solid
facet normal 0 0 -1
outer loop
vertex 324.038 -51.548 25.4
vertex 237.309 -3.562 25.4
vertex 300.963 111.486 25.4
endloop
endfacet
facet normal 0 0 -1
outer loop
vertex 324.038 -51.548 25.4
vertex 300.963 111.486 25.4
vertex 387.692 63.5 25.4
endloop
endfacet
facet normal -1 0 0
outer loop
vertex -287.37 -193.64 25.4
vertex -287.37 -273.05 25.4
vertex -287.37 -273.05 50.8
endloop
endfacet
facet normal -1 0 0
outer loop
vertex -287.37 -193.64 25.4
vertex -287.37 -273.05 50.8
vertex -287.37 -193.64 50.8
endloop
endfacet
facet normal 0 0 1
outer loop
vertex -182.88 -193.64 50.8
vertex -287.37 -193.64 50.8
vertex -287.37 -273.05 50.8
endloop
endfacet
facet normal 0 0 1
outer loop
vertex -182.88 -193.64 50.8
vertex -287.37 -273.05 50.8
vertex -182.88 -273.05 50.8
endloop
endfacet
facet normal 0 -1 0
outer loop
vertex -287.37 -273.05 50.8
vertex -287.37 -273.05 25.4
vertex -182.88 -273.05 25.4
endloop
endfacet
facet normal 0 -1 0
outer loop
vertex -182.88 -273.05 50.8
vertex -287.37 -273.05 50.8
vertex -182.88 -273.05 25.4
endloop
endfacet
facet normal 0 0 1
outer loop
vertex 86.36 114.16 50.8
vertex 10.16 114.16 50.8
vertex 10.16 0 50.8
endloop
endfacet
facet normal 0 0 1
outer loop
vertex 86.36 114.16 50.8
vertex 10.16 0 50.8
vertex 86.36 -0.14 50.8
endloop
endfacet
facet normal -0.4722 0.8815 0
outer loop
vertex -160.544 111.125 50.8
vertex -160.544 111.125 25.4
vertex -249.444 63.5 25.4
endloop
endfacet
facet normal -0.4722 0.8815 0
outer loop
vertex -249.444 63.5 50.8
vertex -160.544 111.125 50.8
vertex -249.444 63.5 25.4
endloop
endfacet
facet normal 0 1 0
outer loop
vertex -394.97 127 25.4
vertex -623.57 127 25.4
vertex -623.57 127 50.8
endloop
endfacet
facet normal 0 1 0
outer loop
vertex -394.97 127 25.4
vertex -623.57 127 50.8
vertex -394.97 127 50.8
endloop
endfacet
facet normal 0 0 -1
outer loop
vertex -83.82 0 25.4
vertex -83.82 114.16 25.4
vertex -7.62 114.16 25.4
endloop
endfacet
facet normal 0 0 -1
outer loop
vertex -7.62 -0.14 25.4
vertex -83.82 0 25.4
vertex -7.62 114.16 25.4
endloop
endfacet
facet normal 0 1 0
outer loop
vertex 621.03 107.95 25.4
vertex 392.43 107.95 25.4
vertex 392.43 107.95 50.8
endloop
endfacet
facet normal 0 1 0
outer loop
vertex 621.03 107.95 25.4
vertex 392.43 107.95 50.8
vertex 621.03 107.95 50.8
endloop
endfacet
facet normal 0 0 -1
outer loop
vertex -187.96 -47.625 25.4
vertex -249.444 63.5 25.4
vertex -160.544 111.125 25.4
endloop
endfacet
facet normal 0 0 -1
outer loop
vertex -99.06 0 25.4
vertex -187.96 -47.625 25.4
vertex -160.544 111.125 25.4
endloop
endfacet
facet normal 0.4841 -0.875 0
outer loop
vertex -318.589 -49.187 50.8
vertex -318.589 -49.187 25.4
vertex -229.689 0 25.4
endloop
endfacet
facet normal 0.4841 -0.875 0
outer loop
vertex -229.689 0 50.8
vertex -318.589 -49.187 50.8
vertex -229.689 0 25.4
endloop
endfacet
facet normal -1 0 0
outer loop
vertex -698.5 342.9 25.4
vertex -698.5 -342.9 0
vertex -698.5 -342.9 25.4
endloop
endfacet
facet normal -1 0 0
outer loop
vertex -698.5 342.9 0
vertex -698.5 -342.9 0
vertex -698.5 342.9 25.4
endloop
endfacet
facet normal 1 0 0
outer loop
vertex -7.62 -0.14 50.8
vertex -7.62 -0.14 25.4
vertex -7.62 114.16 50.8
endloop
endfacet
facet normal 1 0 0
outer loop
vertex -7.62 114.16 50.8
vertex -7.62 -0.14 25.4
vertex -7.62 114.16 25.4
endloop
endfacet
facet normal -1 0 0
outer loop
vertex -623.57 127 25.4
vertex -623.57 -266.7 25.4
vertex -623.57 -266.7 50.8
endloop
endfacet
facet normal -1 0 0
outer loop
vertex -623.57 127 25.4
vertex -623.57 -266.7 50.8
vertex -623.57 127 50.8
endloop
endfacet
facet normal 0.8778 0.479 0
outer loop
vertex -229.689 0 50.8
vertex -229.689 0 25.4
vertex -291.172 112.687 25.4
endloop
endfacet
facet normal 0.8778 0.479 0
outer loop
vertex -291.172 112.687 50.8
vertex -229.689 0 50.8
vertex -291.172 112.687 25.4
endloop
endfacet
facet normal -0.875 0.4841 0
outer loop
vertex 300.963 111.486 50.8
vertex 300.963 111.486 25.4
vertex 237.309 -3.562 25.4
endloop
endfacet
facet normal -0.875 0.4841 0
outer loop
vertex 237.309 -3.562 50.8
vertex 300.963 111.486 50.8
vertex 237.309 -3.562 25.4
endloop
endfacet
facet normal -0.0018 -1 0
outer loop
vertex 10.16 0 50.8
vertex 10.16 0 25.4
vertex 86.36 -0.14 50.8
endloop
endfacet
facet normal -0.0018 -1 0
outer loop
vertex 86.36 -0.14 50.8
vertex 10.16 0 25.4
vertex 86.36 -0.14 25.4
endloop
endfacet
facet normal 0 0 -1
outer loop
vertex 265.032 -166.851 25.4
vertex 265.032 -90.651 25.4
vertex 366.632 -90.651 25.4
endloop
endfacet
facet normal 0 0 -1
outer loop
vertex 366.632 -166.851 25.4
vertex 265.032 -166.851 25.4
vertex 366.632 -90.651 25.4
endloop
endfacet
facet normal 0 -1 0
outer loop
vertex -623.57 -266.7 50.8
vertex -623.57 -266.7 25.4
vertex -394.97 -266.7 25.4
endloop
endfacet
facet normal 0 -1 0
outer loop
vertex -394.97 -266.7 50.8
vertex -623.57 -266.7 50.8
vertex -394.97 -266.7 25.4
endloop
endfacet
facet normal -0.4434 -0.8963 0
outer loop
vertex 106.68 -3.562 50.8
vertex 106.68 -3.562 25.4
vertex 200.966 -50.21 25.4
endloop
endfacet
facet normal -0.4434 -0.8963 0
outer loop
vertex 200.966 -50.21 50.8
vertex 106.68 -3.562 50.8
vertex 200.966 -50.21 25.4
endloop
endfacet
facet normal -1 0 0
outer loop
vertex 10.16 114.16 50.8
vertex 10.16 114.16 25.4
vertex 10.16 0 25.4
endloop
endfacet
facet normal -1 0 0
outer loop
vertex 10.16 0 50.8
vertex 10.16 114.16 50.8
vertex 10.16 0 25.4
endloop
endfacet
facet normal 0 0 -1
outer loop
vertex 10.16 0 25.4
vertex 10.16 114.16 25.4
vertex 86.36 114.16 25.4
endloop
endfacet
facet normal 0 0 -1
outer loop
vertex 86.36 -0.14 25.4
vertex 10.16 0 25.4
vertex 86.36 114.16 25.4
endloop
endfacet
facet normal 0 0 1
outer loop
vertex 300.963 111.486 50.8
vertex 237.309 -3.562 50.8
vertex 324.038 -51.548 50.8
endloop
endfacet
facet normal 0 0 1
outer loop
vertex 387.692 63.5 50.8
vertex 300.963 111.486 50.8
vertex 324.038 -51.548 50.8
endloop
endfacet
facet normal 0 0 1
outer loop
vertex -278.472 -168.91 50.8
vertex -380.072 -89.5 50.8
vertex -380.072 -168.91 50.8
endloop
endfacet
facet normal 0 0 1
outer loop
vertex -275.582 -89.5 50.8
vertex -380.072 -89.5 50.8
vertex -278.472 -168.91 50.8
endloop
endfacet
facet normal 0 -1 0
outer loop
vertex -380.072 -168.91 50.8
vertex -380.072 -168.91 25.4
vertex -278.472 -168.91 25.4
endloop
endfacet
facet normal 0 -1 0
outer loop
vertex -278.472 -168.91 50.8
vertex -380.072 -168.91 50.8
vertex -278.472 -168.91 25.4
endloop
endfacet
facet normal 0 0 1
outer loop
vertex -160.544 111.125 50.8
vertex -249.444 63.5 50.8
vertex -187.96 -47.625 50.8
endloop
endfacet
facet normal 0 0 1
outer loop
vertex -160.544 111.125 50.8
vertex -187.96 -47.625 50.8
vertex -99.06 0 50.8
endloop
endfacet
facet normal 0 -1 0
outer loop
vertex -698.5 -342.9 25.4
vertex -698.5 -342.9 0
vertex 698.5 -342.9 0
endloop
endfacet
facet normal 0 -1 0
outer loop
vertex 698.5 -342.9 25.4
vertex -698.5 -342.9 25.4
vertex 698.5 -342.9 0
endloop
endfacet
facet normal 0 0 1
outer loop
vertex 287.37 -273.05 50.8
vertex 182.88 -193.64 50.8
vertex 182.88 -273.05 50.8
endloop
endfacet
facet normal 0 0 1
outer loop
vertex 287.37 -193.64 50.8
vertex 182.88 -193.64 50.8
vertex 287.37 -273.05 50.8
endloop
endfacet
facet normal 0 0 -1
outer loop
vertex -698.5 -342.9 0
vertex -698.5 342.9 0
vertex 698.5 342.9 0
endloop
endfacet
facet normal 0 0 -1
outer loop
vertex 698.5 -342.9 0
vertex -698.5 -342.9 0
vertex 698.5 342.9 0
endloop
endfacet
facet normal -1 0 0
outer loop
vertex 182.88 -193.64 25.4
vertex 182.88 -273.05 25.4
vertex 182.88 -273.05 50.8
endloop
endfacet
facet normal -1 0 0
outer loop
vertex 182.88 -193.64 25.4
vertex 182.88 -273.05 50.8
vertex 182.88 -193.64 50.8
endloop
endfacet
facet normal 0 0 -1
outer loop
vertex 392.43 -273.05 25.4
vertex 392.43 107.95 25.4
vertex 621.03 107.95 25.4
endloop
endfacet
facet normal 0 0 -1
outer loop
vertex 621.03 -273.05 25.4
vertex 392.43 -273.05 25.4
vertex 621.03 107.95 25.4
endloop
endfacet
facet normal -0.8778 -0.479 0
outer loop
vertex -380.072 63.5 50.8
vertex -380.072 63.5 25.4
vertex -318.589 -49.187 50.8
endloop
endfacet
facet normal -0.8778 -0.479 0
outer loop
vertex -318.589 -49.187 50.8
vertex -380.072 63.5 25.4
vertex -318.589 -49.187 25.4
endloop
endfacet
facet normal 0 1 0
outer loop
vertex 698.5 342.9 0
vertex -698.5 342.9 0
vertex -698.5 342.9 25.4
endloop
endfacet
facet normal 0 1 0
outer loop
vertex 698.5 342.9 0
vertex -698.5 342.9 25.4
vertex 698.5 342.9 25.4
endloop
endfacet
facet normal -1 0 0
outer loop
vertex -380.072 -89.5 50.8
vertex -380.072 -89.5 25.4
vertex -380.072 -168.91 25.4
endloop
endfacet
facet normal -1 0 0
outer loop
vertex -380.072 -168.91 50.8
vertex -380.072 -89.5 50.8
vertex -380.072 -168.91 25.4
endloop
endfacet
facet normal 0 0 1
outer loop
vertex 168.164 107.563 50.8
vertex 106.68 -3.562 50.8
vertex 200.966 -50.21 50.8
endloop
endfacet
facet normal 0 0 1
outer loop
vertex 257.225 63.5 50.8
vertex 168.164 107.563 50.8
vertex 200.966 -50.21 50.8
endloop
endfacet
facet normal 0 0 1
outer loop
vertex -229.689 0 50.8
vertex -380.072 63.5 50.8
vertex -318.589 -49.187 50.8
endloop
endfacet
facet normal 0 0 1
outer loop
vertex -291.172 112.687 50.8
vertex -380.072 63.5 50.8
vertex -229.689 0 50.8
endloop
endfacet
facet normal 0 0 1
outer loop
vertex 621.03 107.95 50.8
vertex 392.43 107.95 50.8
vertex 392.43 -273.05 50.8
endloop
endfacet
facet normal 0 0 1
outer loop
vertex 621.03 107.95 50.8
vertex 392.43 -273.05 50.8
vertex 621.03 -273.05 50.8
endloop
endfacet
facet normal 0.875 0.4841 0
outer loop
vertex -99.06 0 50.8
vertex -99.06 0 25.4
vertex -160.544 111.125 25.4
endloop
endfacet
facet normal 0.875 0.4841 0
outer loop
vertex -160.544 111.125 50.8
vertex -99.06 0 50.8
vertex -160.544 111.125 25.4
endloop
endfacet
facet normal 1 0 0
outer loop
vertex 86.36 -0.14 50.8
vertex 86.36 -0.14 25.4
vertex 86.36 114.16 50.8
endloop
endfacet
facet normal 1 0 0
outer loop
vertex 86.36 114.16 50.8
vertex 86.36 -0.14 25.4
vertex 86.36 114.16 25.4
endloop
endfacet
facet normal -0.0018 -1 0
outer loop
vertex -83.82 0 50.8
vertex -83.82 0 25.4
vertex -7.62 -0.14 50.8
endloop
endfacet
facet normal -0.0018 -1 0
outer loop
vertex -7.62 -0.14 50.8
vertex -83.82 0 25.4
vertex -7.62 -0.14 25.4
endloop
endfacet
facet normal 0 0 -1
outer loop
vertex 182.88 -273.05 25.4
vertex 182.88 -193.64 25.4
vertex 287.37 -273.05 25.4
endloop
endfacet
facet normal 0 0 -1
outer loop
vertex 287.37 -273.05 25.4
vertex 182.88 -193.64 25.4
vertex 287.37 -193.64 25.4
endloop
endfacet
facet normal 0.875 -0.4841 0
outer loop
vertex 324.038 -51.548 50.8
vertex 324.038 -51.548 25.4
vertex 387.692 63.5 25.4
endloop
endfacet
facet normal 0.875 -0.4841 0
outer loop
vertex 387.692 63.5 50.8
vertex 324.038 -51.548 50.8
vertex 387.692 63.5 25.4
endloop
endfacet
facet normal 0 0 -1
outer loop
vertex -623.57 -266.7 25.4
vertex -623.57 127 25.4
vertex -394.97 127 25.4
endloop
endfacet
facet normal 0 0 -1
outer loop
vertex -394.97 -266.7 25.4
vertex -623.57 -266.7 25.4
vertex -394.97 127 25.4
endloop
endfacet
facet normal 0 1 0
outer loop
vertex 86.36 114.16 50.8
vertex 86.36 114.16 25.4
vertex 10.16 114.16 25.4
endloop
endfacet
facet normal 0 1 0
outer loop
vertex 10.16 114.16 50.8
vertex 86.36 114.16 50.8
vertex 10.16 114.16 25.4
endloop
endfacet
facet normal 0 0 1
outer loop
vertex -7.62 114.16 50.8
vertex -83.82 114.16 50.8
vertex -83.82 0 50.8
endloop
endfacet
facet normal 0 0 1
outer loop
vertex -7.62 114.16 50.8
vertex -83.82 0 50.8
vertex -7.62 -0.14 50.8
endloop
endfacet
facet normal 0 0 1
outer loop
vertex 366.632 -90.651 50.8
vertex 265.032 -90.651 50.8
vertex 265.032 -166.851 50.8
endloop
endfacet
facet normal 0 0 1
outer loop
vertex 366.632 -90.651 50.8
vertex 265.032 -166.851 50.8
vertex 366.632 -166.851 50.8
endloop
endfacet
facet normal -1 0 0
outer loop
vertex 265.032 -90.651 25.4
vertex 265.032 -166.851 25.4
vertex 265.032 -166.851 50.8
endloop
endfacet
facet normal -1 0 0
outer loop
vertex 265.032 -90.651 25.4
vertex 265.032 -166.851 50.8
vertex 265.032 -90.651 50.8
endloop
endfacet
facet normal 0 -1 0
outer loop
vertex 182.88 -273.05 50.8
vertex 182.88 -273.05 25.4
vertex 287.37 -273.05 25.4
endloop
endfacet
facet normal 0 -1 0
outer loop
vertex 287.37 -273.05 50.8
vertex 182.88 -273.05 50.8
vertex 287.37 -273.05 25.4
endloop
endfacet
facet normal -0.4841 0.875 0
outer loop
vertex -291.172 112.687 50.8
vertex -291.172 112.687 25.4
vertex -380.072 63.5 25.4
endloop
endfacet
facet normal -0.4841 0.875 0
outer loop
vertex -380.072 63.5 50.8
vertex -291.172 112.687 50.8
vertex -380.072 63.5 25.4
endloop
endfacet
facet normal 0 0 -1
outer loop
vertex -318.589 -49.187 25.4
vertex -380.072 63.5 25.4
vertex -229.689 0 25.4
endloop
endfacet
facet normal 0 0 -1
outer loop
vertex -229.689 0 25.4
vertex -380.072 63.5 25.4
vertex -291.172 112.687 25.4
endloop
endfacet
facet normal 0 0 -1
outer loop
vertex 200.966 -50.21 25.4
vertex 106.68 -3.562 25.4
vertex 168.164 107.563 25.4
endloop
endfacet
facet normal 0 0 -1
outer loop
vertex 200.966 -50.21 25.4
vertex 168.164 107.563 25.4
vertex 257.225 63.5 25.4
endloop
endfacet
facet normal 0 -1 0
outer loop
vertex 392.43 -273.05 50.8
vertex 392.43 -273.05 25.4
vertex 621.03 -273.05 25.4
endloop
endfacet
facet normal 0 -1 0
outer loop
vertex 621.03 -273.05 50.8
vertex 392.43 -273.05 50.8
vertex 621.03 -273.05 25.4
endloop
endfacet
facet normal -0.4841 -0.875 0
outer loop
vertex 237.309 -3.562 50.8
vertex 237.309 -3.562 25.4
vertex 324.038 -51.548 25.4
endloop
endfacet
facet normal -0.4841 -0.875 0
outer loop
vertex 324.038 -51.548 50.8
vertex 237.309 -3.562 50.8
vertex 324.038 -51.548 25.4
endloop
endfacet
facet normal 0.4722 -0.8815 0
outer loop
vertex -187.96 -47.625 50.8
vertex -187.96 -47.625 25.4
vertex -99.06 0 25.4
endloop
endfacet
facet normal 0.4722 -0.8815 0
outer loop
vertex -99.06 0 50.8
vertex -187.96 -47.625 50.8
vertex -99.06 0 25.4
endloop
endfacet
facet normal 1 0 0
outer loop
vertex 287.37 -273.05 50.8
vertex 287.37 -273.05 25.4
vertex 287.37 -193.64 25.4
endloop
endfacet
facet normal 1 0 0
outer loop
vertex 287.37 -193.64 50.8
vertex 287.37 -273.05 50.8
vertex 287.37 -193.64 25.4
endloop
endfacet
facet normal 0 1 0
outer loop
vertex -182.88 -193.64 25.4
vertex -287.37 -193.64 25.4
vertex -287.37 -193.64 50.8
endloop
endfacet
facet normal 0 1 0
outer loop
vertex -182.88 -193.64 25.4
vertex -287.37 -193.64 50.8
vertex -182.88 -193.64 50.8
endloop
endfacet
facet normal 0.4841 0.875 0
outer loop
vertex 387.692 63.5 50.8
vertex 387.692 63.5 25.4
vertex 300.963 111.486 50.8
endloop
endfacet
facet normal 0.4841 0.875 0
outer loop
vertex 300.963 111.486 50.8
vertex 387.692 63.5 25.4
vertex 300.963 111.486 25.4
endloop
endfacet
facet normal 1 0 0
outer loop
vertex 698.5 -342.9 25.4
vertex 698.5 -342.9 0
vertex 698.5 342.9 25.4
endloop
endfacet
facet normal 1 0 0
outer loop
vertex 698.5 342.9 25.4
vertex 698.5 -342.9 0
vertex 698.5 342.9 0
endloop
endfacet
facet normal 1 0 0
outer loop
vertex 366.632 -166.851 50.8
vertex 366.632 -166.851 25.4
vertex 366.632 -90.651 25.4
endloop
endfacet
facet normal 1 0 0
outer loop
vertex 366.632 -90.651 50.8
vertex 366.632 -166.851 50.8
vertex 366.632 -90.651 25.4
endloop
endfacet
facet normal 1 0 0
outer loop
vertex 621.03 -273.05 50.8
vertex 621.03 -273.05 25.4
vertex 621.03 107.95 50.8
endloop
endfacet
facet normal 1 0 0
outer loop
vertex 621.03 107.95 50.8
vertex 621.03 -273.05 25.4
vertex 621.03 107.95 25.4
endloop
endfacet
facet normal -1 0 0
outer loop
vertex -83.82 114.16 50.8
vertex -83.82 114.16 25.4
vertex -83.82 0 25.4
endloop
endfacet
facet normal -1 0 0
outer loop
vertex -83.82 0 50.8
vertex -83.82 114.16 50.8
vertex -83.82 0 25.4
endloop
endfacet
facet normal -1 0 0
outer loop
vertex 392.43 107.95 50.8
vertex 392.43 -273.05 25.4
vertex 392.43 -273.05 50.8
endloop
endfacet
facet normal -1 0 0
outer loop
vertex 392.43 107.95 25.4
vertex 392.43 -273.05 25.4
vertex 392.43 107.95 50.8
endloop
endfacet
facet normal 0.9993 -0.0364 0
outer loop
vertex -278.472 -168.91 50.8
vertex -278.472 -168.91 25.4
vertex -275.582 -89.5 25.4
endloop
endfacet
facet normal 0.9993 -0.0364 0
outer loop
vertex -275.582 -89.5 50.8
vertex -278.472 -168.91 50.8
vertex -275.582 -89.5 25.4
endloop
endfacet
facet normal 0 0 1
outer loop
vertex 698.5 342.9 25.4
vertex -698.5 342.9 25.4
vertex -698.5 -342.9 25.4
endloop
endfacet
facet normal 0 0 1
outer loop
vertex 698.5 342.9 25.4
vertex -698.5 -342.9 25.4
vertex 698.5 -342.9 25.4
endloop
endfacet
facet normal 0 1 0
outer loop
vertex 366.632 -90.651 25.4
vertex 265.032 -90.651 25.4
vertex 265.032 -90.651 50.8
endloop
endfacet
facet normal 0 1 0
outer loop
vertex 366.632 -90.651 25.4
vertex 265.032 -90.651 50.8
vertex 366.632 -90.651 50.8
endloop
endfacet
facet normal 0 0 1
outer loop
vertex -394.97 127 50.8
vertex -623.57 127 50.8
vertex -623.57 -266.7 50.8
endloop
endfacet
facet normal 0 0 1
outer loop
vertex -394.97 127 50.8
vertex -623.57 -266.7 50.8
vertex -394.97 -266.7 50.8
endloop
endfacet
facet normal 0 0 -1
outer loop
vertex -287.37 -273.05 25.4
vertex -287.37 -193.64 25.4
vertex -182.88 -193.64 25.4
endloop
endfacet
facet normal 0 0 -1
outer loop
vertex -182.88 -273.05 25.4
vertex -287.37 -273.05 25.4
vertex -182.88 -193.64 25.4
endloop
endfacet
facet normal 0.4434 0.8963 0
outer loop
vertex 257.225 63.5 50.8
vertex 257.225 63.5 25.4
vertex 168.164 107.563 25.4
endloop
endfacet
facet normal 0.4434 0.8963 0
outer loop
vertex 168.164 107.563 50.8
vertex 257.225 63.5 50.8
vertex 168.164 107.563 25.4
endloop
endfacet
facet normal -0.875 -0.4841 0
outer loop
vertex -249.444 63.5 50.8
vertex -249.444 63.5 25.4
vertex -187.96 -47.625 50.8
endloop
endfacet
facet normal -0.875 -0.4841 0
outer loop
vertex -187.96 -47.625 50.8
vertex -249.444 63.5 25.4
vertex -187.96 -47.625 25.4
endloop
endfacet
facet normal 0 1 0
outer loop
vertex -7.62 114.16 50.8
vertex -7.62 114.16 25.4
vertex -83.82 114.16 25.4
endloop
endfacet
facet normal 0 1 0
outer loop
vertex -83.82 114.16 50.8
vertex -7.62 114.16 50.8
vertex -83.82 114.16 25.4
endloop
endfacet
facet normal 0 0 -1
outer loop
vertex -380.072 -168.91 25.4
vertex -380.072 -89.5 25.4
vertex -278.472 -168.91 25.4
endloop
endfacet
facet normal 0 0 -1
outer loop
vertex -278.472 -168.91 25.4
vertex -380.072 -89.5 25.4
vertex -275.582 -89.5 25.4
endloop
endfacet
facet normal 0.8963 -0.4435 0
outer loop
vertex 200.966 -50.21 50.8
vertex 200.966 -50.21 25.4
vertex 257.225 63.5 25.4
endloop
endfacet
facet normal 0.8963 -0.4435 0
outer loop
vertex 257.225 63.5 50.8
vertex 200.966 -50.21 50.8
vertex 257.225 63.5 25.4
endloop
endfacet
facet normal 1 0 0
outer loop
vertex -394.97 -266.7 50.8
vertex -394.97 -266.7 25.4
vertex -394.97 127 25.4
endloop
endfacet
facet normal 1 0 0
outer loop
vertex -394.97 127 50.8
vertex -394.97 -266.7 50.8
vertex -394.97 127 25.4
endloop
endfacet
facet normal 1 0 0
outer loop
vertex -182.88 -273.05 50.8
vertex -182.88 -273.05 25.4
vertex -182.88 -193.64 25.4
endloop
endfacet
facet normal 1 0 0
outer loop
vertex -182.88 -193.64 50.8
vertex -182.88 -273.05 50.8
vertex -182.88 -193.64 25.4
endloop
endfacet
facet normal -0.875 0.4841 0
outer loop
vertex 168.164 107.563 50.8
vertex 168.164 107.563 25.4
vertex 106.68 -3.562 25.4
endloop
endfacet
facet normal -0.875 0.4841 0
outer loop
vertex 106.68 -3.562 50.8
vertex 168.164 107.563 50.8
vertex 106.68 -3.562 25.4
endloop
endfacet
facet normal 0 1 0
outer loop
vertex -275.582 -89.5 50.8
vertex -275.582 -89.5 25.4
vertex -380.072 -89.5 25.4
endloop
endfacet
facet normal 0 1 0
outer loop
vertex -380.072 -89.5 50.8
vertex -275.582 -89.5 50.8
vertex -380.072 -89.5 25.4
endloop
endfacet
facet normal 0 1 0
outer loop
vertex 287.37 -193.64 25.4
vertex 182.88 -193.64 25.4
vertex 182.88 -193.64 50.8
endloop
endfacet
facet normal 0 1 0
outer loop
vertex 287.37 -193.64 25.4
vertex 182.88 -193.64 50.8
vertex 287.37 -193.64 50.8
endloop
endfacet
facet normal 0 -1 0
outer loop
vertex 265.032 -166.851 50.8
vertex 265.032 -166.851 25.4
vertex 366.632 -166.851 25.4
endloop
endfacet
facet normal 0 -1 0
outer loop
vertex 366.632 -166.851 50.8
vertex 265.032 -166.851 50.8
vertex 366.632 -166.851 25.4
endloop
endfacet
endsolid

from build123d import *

# Parameters (mm, degrees)
F0_W     = 1397
F0_H     = 685.8
F1_DEPTH = 25.4
F2_W     = 228.6
F2_H     = 393.7
F2_H_2   = 381
F2_W_2   = 104.490054
F2_H_3   = 79.409756
F2_W_3   = 101.6
F2_H_4   = 76.2
F3_DEPTH = 25.4


with BuildPart() as f1:
    # F0 (on Top) → F1 (new body)
    with BuildSketch(Plane.XY):
        Rectangle(F0_W, F0_H)
    extrude(amount=F1_DEPTH)


with BuildPart() as f3:
    # F2 (on face) → F3 (new body)
    with BuildSketch(Plane.XY.offset(25.4)):
        with Locations((-509.270025, -69.85)):
            Rectangle(F2_W, F2_H)
        with Locations((506.729975, -82.55)):
            Rectangle(F2_W, F2_H_2)
        with Locations((235.125002, -233.345122)):
            Rectangle(F2_W_2, F2_H_3)
        Polygon((168.163586, 107.563006), (106.679975, -3.561994), (200.966421, -50.210266), (257.224639, 63.5), align=None)
        Polygon((300.962673, 111.485978), (237.308546, -3.561994), (324.038031, -51.547973), (387.692157, 63.5), align=None)
        Polygon((-99.059997, -1e-06), (-160.543608, 111.124999), (-249.443608, 63.499999), (-187.959997, -47.625001), align=None)
        Polygon((-229.688569, -1e-06), (-291.172179, 112.686888), (-380.072179, 63.499999), (-318.588569, -49.186889), align=None)
        Polygon((-83.819984, 114.159763), (-83.819984, -1e-06), (-7.619984, -0.140237), (-7.619984, 114.159763), align=None)
        Polygon((10.160015, 114.159764), (10.160015, 0), (86.360015, -0.140236), (86.360015, 114.159764), align=None)
        with Locations((-235.125002, -233.345122)):
            Rectangle(F2_W_2, F2_H_3)
        Polygon((-278.472179, -168.910027), (-275.582125, -89.50027), (-380.072179, -89.50027), (-380.072179, -168.910027), align=None)
        with Locations((315.83247, -128.750707)):
            Rectangle(F2_W_3, F2_H_4)
    extrude(amount=F3_DEPTH)


solid = Compound([f1.part, f3.part])
